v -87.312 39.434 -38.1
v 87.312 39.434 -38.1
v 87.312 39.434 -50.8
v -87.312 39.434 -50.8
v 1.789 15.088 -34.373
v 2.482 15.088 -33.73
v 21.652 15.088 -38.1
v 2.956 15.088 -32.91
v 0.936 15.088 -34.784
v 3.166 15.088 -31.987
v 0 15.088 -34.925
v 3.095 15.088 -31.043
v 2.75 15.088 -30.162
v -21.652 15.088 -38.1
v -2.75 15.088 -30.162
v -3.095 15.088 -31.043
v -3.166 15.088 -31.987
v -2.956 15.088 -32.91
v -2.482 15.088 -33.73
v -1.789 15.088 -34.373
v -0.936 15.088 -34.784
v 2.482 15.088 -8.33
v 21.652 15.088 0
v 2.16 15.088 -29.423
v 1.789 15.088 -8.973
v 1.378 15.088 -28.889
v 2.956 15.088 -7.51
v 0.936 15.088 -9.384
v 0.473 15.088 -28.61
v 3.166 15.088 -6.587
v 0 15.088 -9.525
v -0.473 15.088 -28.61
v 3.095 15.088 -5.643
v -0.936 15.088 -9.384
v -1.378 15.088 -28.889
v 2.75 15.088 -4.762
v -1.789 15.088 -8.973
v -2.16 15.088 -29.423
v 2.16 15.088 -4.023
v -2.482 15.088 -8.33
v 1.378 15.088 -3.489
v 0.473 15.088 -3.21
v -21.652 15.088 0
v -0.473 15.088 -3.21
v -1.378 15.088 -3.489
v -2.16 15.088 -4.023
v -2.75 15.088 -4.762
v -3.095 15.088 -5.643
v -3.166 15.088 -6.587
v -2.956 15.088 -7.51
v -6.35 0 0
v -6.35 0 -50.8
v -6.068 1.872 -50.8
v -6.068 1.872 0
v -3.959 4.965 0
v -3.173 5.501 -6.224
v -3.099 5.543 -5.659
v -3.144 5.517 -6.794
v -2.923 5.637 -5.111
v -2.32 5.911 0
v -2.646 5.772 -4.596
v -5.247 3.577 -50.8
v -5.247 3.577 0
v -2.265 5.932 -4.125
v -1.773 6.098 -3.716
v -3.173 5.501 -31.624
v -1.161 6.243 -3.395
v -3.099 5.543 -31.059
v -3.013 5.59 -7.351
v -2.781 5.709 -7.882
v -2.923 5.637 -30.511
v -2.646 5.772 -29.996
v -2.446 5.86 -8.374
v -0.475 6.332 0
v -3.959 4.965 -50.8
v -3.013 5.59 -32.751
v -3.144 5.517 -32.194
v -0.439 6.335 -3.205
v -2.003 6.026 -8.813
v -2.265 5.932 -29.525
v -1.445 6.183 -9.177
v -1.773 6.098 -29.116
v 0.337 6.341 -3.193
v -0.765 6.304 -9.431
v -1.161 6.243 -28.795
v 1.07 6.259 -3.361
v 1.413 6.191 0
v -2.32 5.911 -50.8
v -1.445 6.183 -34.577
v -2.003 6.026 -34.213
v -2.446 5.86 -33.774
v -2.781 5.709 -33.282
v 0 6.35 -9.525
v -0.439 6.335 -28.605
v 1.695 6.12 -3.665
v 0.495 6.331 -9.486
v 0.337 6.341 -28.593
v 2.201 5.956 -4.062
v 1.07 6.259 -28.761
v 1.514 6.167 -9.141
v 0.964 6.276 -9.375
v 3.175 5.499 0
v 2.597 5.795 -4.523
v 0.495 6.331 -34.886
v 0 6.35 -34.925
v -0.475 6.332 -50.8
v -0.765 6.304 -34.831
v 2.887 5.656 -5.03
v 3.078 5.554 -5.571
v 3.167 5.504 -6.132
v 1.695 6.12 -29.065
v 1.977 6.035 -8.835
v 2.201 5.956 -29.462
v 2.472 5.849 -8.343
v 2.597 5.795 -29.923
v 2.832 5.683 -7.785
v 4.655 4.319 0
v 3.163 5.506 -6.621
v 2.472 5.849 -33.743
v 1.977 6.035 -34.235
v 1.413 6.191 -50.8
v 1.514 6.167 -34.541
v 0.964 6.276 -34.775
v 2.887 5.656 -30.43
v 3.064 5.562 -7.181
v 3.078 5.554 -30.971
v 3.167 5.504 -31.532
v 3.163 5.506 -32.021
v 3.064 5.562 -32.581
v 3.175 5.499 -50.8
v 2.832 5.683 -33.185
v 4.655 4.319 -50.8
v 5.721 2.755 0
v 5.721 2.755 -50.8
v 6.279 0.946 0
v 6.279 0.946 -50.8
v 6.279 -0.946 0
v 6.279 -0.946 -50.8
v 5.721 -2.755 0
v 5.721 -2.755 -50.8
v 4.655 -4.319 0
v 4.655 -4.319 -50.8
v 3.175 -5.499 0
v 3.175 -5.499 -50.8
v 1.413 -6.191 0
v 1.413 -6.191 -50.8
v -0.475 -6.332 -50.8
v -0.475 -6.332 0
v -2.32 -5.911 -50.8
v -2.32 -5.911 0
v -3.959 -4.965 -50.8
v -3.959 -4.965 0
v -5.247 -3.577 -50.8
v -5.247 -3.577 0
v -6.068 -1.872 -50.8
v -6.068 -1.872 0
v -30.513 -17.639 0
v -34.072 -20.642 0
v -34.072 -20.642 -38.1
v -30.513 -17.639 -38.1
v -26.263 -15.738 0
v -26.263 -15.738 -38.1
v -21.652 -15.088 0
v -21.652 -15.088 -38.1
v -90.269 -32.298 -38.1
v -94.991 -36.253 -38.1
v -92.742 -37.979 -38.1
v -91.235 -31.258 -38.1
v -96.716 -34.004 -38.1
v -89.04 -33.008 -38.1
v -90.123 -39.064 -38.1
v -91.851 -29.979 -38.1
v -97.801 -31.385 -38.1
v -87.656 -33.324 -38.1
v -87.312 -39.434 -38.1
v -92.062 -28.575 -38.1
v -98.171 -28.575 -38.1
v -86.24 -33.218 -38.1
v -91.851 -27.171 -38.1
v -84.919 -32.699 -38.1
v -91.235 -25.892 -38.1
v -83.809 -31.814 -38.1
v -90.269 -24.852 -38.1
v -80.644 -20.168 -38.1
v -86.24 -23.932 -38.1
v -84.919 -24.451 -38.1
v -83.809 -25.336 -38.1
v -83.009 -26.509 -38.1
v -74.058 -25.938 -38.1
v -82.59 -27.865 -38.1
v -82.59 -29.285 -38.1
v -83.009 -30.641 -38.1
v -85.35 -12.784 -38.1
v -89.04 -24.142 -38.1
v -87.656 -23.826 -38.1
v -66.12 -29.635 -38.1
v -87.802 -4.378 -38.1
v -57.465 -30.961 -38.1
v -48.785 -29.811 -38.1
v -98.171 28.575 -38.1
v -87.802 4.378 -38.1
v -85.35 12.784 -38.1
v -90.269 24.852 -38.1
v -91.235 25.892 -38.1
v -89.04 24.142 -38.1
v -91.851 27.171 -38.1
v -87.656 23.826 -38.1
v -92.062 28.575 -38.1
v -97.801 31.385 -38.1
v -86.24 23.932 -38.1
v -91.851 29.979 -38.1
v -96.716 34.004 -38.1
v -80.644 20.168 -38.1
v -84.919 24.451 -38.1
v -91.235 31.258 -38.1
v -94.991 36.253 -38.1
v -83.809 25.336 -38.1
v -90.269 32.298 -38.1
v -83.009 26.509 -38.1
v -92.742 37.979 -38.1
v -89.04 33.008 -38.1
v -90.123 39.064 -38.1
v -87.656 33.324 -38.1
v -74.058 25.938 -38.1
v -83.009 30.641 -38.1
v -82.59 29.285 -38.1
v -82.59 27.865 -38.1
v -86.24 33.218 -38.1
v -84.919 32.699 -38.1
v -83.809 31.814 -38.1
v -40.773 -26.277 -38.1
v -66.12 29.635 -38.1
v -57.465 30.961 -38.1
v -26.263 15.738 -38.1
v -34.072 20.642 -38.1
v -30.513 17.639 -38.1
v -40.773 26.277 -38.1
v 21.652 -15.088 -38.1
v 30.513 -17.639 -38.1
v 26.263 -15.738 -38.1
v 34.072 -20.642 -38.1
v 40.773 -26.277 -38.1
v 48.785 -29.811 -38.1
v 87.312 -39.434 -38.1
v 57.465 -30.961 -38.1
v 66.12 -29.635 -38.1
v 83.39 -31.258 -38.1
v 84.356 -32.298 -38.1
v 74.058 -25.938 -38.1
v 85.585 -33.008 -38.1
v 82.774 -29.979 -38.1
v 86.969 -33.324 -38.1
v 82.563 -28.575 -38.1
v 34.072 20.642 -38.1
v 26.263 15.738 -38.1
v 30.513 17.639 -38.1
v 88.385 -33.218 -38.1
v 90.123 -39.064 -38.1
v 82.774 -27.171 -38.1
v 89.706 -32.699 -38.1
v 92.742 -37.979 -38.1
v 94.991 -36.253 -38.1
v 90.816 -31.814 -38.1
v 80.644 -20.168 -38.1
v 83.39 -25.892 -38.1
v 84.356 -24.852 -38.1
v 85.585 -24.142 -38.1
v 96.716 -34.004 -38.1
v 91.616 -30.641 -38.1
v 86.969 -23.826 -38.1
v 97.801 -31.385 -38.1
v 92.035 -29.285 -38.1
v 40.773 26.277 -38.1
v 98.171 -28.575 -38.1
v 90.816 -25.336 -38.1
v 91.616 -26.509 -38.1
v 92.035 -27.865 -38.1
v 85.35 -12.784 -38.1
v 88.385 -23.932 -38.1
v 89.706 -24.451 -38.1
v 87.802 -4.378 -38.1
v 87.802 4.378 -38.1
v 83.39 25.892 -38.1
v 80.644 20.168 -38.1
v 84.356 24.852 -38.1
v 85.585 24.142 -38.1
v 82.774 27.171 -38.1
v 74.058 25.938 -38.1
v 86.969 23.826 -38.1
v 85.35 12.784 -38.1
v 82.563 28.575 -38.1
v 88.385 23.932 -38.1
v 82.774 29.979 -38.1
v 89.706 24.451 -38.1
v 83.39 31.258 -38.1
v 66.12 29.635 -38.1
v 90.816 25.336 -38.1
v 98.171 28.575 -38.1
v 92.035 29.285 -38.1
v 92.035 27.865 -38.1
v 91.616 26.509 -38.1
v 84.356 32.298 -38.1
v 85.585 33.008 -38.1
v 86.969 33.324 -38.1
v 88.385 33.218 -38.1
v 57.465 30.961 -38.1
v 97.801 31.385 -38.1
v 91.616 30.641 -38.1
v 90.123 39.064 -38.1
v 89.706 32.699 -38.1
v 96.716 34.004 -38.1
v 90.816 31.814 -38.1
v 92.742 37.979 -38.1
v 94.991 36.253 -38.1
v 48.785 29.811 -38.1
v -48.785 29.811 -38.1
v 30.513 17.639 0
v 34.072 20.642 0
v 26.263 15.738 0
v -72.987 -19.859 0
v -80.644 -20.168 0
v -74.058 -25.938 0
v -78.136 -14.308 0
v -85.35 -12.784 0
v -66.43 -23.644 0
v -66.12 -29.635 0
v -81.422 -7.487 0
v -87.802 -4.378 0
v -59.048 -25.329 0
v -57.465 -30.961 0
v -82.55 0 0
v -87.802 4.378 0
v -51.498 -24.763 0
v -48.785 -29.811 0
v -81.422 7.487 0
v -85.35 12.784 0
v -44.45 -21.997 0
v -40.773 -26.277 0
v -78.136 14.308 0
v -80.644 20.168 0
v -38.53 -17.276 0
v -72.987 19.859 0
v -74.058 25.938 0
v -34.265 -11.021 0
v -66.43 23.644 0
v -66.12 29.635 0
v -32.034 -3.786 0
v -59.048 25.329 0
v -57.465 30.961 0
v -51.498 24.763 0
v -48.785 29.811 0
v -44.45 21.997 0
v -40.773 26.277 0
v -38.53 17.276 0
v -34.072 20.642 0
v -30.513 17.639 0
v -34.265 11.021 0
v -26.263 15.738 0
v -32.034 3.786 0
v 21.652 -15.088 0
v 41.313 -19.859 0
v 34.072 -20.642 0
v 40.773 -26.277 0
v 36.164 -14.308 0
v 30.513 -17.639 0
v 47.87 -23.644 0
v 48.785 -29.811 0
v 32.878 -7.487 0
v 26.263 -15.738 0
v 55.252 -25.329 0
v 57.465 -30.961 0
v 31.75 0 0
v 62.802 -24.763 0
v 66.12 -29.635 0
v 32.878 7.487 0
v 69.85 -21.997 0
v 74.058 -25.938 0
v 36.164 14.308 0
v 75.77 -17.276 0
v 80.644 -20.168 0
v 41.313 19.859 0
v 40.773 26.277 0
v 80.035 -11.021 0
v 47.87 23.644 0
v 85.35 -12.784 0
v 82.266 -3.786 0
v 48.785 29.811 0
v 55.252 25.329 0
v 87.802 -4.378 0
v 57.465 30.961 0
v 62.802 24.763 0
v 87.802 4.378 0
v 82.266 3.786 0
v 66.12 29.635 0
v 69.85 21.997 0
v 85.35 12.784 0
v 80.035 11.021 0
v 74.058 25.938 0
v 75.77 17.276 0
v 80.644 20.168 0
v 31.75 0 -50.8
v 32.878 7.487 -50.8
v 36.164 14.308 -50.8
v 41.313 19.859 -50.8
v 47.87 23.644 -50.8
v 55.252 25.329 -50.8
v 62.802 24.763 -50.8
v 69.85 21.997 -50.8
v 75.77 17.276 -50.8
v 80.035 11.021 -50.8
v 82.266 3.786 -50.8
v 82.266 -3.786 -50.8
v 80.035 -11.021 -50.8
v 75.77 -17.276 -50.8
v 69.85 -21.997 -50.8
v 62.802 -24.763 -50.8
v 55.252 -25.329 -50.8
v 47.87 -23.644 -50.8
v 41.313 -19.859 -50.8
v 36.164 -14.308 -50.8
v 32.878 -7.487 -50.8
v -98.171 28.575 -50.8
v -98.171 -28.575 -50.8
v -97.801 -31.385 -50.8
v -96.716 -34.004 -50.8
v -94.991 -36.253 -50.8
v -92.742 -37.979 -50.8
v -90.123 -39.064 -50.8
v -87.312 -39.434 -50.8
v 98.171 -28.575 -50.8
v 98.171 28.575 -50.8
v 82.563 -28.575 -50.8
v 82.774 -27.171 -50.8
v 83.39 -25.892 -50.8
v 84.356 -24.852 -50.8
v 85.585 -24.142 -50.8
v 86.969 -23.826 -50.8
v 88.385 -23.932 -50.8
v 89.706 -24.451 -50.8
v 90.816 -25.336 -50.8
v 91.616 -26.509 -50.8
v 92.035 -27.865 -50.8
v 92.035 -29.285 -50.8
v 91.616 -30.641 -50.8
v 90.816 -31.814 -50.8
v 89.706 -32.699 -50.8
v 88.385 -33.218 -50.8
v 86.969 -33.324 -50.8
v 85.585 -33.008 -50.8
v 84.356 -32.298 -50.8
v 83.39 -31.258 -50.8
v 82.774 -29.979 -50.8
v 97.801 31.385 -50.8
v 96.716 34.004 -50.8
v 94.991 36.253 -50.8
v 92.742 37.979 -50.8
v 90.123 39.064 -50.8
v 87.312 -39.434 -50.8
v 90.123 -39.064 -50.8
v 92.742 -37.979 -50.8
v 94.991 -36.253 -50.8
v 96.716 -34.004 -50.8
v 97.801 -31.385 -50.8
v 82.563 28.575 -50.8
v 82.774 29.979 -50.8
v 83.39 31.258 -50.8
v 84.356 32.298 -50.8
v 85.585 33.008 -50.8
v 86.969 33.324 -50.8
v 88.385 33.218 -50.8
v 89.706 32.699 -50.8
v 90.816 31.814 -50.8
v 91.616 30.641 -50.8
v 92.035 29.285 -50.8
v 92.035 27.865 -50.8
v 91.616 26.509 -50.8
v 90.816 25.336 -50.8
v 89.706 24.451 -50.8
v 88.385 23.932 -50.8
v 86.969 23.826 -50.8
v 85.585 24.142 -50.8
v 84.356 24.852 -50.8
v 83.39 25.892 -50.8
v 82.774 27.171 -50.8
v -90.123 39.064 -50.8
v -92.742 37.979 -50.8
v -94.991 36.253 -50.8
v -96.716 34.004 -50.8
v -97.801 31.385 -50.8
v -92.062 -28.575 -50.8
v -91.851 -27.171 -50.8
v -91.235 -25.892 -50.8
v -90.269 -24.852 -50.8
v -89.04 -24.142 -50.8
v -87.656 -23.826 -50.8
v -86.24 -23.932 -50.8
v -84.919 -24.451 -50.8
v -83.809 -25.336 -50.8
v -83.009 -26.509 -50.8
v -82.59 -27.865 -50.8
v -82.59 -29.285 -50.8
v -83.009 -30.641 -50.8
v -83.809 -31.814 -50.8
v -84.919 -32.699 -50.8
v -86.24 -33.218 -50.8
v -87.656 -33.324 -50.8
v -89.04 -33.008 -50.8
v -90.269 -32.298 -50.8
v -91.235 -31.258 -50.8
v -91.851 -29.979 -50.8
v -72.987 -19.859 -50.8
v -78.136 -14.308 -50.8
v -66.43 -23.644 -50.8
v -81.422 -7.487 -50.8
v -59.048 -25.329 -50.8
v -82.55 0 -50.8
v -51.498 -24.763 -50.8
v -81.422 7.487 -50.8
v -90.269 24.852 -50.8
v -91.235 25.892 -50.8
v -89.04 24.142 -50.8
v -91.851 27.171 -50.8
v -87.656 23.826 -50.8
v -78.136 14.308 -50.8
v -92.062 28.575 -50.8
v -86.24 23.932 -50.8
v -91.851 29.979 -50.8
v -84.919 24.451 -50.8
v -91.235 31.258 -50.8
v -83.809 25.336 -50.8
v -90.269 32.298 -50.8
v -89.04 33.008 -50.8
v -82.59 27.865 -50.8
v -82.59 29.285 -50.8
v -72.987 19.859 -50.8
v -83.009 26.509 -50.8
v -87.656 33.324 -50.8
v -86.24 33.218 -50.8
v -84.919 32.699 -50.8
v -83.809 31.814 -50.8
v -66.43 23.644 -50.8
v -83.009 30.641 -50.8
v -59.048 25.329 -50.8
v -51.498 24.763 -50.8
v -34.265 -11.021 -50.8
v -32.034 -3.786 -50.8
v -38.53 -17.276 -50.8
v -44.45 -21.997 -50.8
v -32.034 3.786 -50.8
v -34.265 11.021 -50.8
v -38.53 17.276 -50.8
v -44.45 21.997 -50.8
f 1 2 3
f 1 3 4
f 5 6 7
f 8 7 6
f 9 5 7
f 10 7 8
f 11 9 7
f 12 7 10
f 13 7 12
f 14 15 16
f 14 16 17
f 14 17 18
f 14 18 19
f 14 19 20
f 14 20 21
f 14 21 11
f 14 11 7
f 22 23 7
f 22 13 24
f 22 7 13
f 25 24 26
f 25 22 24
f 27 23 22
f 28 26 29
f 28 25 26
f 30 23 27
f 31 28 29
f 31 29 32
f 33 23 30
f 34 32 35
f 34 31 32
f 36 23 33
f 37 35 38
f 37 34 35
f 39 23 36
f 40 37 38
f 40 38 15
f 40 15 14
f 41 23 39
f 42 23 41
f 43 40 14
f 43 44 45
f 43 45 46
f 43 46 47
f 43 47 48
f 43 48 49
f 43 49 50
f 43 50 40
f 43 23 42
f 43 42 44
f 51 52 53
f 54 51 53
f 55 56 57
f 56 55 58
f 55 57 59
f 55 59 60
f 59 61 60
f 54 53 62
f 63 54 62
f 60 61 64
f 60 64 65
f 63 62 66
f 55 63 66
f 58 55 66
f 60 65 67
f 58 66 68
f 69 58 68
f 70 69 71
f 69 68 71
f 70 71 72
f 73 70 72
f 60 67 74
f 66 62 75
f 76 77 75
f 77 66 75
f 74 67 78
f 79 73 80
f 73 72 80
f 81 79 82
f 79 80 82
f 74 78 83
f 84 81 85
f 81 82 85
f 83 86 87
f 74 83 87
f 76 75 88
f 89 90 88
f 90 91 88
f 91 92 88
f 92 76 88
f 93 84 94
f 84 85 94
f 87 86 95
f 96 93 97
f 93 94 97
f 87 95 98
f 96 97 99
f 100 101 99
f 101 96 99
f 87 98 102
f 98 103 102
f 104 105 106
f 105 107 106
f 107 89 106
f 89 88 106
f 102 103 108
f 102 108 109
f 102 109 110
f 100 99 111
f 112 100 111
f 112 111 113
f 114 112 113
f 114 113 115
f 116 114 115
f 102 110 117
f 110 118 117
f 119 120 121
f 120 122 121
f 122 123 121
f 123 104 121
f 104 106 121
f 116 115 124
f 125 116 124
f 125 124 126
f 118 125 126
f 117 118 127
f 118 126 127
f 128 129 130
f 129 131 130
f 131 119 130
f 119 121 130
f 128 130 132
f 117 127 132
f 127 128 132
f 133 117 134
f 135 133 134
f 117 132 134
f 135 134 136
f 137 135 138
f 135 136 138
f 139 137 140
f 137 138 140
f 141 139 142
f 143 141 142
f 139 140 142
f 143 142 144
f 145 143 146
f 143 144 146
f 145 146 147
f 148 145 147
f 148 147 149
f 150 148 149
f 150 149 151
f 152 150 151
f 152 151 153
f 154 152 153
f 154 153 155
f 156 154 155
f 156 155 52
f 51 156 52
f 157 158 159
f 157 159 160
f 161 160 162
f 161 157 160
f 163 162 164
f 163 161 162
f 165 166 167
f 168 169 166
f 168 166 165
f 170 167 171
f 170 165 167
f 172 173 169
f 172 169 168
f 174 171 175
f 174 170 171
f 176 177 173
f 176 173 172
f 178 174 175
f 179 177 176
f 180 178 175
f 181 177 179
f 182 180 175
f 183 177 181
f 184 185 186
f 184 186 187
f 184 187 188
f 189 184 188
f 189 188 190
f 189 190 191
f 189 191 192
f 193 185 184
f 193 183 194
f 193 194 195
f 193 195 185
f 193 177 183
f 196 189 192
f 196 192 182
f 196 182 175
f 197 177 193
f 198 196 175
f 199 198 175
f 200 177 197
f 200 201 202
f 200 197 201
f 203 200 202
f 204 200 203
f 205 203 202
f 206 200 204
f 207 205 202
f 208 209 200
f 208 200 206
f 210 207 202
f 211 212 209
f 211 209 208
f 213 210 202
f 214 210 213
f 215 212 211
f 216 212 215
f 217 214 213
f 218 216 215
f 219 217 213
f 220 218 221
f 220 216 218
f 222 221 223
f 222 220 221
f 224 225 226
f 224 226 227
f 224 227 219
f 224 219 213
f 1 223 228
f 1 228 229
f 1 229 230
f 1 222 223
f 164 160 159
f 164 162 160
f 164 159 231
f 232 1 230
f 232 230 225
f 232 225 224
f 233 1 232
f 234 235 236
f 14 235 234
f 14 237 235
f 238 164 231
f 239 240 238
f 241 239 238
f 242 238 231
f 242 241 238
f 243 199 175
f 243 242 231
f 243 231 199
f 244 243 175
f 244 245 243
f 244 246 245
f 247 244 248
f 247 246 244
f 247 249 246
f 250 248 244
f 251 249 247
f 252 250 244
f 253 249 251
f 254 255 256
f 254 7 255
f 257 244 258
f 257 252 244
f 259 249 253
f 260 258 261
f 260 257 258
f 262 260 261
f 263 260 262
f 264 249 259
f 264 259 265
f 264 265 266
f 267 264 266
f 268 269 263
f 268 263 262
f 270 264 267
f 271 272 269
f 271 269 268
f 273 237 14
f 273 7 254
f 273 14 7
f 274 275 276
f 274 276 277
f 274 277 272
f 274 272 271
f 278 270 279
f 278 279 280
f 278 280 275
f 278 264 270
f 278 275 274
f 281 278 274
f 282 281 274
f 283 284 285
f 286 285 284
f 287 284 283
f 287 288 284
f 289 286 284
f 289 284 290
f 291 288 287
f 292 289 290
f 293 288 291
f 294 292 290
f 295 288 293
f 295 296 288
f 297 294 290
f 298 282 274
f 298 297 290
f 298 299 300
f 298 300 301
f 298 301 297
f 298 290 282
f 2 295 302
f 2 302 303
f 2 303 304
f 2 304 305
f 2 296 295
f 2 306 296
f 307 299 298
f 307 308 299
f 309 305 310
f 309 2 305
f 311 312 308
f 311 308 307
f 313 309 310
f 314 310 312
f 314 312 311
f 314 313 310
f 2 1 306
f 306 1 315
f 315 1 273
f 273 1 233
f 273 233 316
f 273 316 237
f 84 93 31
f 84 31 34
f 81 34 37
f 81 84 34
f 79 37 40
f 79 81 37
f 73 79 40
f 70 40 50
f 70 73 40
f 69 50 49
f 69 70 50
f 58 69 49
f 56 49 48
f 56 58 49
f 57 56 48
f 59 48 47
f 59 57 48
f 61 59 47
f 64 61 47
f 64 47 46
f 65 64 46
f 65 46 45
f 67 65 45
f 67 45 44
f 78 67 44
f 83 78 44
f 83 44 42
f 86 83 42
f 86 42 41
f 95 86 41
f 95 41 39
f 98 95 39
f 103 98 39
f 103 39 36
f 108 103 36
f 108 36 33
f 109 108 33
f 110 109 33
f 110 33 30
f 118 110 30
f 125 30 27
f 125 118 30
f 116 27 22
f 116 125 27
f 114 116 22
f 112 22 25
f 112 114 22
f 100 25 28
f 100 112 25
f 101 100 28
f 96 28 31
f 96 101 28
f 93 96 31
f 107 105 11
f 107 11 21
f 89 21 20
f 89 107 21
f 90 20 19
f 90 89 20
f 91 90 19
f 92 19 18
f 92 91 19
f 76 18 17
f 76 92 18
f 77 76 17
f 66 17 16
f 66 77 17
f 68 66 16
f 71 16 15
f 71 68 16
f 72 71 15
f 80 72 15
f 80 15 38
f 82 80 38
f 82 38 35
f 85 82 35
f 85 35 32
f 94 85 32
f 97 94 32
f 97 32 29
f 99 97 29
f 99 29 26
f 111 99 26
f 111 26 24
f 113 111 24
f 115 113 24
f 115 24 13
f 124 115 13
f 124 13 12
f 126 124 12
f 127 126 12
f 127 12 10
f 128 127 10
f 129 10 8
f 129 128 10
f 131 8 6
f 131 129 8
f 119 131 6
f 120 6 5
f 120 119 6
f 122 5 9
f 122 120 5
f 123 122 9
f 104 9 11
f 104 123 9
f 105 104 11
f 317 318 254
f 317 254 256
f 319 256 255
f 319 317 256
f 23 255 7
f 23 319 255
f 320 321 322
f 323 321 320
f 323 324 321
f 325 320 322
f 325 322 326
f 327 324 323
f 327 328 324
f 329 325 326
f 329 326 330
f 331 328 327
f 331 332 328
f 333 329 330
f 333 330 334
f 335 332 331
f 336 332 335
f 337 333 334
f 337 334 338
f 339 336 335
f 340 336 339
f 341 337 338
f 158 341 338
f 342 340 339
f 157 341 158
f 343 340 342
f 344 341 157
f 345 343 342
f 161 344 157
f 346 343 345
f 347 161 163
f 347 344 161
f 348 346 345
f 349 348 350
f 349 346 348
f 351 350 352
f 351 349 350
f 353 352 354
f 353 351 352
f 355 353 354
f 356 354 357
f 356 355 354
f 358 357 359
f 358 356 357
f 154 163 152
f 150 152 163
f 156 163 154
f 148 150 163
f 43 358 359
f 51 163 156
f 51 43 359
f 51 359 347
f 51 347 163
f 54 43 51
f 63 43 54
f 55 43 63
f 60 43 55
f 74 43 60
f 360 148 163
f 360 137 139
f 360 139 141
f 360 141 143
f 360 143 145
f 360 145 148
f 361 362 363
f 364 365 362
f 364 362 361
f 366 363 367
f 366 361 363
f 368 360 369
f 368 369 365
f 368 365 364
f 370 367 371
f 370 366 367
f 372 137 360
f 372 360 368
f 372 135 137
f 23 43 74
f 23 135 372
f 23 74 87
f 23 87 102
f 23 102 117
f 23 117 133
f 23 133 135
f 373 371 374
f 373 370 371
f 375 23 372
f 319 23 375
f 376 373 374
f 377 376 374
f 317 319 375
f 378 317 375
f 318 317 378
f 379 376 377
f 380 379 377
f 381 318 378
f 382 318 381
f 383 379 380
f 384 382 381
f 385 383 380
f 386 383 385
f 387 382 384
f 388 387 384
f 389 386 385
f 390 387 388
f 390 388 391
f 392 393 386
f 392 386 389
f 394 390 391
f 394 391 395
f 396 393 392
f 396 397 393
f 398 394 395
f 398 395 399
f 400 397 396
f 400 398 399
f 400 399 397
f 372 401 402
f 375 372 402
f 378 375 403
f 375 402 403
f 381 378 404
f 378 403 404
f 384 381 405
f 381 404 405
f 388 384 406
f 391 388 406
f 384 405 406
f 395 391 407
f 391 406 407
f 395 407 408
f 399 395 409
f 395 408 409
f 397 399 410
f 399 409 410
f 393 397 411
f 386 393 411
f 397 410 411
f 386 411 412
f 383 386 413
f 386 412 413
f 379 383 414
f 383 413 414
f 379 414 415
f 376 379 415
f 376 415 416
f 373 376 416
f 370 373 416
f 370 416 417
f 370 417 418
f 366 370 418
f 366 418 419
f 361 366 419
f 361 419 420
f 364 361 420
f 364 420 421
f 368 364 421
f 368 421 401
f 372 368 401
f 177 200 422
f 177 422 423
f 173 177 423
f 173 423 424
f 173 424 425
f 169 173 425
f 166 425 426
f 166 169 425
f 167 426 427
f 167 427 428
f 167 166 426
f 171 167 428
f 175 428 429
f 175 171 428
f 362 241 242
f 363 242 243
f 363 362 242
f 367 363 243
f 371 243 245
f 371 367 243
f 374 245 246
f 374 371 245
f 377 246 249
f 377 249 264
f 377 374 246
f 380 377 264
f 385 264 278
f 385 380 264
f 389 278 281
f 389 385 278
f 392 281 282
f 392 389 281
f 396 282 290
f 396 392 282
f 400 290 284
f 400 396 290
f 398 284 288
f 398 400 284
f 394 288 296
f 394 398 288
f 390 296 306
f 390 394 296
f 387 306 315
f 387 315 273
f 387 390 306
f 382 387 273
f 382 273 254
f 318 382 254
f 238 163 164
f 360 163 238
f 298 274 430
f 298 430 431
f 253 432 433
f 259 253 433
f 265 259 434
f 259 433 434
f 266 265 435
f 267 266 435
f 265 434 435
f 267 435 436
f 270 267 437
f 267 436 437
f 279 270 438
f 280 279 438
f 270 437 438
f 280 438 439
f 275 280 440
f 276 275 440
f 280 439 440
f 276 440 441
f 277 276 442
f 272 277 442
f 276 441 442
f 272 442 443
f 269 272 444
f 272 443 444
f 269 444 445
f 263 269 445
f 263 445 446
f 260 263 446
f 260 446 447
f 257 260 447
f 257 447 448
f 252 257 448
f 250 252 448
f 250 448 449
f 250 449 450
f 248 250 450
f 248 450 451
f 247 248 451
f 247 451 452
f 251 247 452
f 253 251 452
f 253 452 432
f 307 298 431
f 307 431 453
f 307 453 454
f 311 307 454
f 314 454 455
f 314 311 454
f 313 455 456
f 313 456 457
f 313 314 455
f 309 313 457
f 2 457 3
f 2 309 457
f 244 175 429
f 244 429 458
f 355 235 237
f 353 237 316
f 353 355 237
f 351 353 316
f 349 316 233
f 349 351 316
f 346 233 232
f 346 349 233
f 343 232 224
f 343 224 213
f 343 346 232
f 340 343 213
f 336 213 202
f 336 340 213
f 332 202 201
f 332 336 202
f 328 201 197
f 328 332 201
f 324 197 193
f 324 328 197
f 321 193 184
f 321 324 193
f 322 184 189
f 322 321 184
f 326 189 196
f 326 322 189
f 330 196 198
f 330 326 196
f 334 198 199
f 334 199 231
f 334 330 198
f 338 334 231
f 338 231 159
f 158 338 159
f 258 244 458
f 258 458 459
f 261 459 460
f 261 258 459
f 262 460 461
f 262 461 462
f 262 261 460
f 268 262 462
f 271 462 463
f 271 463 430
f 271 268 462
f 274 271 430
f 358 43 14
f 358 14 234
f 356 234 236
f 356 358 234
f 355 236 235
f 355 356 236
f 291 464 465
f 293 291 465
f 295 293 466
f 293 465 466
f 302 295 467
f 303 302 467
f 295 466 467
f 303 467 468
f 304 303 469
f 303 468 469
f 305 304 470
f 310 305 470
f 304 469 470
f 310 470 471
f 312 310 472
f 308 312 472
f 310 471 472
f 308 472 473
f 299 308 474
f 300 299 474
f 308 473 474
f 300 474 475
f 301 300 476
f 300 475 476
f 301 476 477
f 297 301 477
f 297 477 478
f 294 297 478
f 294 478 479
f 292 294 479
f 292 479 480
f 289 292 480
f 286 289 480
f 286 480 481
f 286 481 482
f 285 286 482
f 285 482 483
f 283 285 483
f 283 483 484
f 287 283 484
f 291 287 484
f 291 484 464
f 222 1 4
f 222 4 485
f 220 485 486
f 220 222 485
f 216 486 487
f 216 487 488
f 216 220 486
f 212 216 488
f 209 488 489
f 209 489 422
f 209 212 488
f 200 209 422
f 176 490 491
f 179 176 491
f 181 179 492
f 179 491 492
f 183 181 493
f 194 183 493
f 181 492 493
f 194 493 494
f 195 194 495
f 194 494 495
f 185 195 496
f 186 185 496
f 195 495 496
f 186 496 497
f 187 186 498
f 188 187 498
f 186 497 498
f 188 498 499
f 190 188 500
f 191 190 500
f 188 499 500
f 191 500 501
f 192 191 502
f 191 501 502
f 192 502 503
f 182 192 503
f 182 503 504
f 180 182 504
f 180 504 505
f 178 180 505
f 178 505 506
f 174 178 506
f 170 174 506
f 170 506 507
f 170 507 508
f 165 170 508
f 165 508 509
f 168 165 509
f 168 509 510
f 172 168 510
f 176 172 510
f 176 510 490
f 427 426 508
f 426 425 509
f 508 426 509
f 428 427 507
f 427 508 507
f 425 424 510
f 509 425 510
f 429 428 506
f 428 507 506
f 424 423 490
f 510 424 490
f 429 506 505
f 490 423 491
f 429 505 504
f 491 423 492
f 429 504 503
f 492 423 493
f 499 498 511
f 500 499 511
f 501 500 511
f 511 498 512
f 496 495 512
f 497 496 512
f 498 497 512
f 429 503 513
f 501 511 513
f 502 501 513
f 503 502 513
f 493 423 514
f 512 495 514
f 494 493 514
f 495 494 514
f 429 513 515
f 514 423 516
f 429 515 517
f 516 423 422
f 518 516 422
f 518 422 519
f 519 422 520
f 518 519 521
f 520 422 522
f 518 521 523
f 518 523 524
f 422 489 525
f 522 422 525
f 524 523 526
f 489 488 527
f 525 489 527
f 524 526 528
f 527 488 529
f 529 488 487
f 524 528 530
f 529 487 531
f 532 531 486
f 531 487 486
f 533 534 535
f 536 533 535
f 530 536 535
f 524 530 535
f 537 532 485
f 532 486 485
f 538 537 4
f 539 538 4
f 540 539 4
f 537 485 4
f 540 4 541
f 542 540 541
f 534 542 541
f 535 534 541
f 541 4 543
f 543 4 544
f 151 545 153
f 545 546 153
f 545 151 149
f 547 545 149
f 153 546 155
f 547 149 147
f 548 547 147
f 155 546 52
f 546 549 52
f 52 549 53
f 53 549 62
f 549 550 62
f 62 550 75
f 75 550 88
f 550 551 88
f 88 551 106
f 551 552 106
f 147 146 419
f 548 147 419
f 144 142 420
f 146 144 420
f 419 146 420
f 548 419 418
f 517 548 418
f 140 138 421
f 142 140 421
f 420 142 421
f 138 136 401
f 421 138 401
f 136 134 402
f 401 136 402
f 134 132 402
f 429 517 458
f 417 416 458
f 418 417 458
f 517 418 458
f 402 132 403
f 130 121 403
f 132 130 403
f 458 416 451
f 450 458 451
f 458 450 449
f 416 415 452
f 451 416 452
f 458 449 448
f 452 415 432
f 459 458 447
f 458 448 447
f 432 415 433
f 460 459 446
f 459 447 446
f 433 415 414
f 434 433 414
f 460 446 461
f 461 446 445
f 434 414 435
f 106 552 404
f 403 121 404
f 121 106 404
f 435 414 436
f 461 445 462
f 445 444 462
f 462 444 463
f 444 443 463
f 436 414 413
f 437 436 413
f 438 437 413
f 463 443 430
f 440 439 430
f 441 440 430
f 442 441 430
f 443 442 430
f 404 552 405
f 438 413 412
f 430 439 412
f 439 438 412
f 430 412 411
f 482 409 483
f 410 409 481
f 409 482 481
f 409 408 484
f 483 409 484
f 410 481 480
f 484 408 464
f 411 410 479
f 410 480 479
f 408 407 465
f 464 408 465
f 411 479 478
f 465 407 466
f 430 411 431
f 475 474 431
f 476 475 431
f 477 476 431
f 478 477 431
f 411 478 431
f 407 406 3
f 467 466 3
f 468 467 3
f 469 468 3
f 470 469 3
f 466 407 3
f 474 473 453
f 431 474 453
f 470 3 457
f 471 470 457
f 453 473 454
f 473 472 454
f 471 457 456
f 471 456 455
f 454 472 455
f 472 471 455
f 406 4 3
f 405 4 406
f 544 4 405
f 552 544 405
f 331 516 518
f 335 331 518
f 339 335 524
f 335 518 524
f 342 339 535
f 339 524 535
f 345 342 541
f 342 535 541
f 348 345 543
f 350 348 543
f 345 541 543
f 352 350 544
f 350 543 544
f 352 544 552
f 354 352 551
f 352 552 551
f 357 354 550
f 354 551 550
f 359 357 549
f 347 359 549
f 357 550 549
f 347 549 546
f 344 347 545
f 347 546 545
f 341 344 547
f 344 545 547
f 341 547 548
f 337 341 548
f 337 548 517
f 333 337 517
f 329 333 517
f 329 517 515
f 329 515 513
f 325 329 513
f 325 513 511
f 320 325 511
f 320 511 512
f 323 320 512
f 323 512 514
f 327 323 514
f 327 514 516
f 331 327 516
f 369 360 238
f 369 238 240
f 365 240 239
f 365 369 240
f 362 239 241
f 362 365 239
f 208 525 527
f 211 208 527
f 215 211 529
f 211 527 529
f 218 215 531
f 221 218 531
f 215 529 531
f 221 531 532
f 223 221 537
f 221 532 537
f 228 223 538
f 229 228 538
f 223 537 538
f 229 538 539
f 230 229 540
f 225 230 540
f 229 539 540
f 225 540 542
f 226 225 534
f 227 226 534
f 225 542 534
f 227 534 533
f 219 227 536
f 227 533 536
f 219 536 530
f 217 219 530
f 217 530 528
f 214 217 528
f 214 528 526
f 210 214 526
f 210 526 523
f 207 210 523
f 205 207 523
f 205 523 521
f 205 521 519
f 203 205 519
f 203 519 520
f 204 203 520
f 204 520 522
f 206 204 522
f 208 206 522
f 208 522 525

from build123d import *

# Parameters (mm, degrees)
BASE_EXTRUDE_DEPTH           = 50.8
BASE_EXTRUDE_DRAFT           = 3
SKETCH2_W                    = 245.218721479
SKETCH2_H                    = 134.011608982
CUT_EXTRUDE5_DEPTH           = 38.1
CUT_EXTRUDE5_DRAFT           = -5
SKETCH3_R                    = 24.60625
CUT_EXTRUDE1_DEPTH           = 123.388297682
CUT_EXTRUDE1_DRAFT           = -5
CUT_EXTRUDE1_PROFILE_2_DEPTH = 123.388297682
CUT_EXTRUDE1_PROFILE_2_DRAFT = -5
SKETCH5_W                    = 217.80183091
SKETCH5_H                    = 114.879329543
MILL_OUTSIDE_DEPTH           = 123.388297682
SKETCH9_W                    = 228.055799475
SKETCH9_H                    = 112.000717684
MILL_BOSS_DEPTH              = 38.1
SKETCH4_R                    = 25.4
SKETCH4_R_2                  = 6.35
SKETCH4_R_3                  = 4.7625
BORES_AND_HOLES_DEPTH        = 118.359218484
SKETCH18_R                   = 3.175
SET_SCREW_HOLES_DEPTH        = 38.1


with BuildPart() as part:
    # Sketch1 → Base-Extrude (with draft: the straight prism first)
    with BuildSketch(Plane.XY):
        with BuildLine():
            Line((99.7585, -28.575), (99.7585, 28.575))
            ThreePointArc((99.7585, 28.575), (96.113150999, 37.375650999), (87.3125, 41.021))
            Line((87.3125, 41.021), (-87.3125, 41.021))
            ThreePointArc((-87.3125, 41.021), (-96.113150999, 37.375650999), (-99.7585, 28.575))
            Line((-99.7585, 28.575), (-99.7585, -28.575))
            ThreePointArc((-99.7585, -28.575), (-96.113150999, -37.375650999), (-87.3125, -41.021))
            Line((-87.3125, -41.021), (87.3125, -41.021))
            ThreePointArc((87.3125, -41.021), (96.113150999, -37.375650999), (99.7585, -28.575))
        make_face()
    extrude(amount=-BASE_EXTRUDE_DEPTH)
    # Base-Extrude: the draft: its side faces are tilted about the plane it starts from
    base_extrude_sides = [part.faces().sort_by_distance(p)[0] for p in [
        (99.7585, 0, -25.4),
        (96.113150999, 37.375650999, -25.4),
        (0, 41.021, -25.4),
        (-96.113150999, 37.375650999, -25.4),
        (-99.7585, 0, -25.4),
        (-96.113150999, -37.375650999, -25.4),
        (0, -41.021, -25.4),
        (96.113150999, -37.375650999, -25.4),
    ]]
    draft(base_extrude_sides, Plane.XY, BASE_EXTRUDE_DRAFT)


with BuildPart() as cut_extrude5_tool:
    # Sketch2 → Cut-Extrude5 (with draft: the straight prism first)
    with BuildSketch(Plane.XY):
        with Locations((-2.312638736, -3.991522499)):
            Rectangle(SKETCH2_W, SKETCH2_H)
        with BuildLine():
            Line((-21.652420857, 19.05), (21.652420857, 19.05))
            ThreePointArc((21.652420857, 19.05), (26.837174146, 20.156539199), (31.118441962, 23.283333333))
            ThreePointArc((31.118441962, 23.283333333), (92.075, 0), (31.118441962, -23.283333333))
            ThreePointArc((31.118441962, -23.283333333), (26.837174146, -20.156539199), (21.652420857, -19.05))
            Line((21.652420857, -19.05), (-21.652420857, -19.05))
            ThreePointArc((-21.652420857, -19.05), (-26.837174146, -20.156539199), (-31.118441962, -23.283333333))
            ThreePointArc((-31.118441962, -23.283333333), (-92.075, 0), (-31.118441962, 23.283333333))
            ThreePointArc((-31.118441962, 23.283333333), (-26.837174146, 20.156539199), (-21.652420857, 19.05))
        make_face(mode=Mode.SUBTRACT)
    extrude(amount=-CUT_EXTRUDE5_DEPTH)
    # Cut-Extrude5: the draft: its side faces are tilted about the plane it starts from
    cut_extrude5_sides = [cut_extrude5_tool.faces().sort_by_distance(p)[0] for p in [
        (-124.921999475, -3.991522499, -19.05),
        (-2.312638735, -70.99732699, -19.05),
        (120.296722004, -3.991522499, -19.05),
        (-2.312638735, 63.014281992, -19.05),
        (-26.837174146, 20.156539199, -19.05),
        (0, 19.05, -19.05),
        (26.837174146, 20.156539199, -19.05),
        (92.075, 0, -19.05),
        (26.837174146, -20.156539199, -19.05),
        (0, -19.05, -19.05),
        (-26.837174146, -20.156539199, -19.05),
        (-92.075, 0, -19.05),
    ]]
    draft(cut_extrude5_sides, Plane.XY, CUT_EXTRUDE5_DRAFT)


with BuildPart() as part_1:
    add(part.part)

    # Cut-Extrude5: cut by cut_extrude5_tool
    add(cut_extrude5_tool.part, mode=Mode.SUBTRACT)


with BuildPart() as cut_extrude1_tool:
    # Sketch3 → Cut-Extrude1 (with draft: the straight prism first)
    with BuildSketch(Plane(origin=(0, 0, -50.8), x_dir=(-1, 0, 0), z_dir=(0, 0, -1))):
        with Locations((57.15, 0)):
            Circle(SKETCH3_R)
    extrude(amount=-CUT_EXTRUDE1_DEPTH)
    # Cut-Extrude1: the draft: its side faces are tilted about the plane it starts from
    cut_extrude1_sides = [cut_extrude1_tool.faces().sort_by_distance(p)[0] for p in [
        (-32.54375, 0, 10.894148841),
    ]]
    draft(cut_extrude1_sides, Plane(origin=(0, 0, -50.8), x_dir=(-1, 0, 0), z_dir=(0, 0, -1)), CUT_EXTRUDE1_DRAFT)


with BuildPart() as part_2:
    add(part_1.part)

    # Cut-Extrude1: cut by cut_extrude1_tool
    add(cut_extrude1_tool.part, mode=Mode.SUBTRACT)


with BuildPart() as cut_extrude1_profile_2_tool:
    # Sketch3 → Cut-Extrude1 profile 2 (with draft: the straight prism first)
    with BuildSketch(Plane(origin=(0, 0, -50.8), x_dir=(-1, 0, 0), z_dir=(0, 0, -1))):
        with Locations((-57.15, 0)):
            Circle(SKETCH3_R)
    extrude(amount=-CUT_EXTRUDE1_PROFILE_2_DEPTH)
    # Cut-Extrude1 profile 2: the draft: its side faces are tilted about the plane it starts from
    cut_extrude1_profile_2_sides = [cut_extrude1_profile_2_tool.faces().sort_by_distance(p)[0] for p in [
        (81.75625, 0, 10.894148841),
    ]]
    draft(cut_extrude1_profile_2_sides, Plane(origin=(0, 0, -50.8), x_dir=(-1, 0, 0), z_dir=(0, 0, -1)), CUT_EXTRUDE1_PROFILE_2_DRAFT)


with BuildPart() as part_3:
    add(part_2.part)

    # Cut-Extrude1 profile 2: cut by cut_extrude1_profile_2_tool
    add(cut_extrude1_profile_2_tool.part, mode=Mode.SUBTRACT)

    # Sketch5 → Mill outside (cut, through all)
    with BuildSketch(Plane.XY):
        with Locations((-0.351671417, -5.861190283)):
            Rectangle(SKETCH5_W, SKETCH5_H)
        with BuildLine():
            Line((98.171, -28.575), (98.171, 28.575))
            ThreePointArc((98.171, 28.575), (94.990618984, 36.253118984), (87.3125, 39.4335))
            Line((87.3125, 39.4335), (-87.3125, 39.4335))
            ThreePointArc((-87.3125, 39.4335), (-94.990618984, 36.253118984), (-98.171, 28.575))
            Line((-98.171, 28.575), (-98.171, -28.575))
            ThreePointArc((-98.171, -28.575), (-94.990618984, -36.253118984), (-87.3125, -39.4335))
            Line((-87.3125, -39.4335), (87.3125, -39.4335))
            ThreePointArc((87.3125, -39.4335), (94.990618984, -36.253118984), (98.171, -28.575))
        make_face(mode=Mode.SUBTRACT)
    extrude(amount=-MILL_OUTSIDE_DEPTH, mode=Mode.SUBTRACT)

    # Sketch9 → Mill boss (cut)
    with BuildSketch(Plane.XY):
        with Locations((8.711546203, 4.265795104)):
            Rectangle(SKETCH9_W, SKETCH9_H)
        with BuildLine():
            Line((-21.652420857, -15.0876), (21.652420857, -15.0876))
            ThreePointArc((21.652420857, -15.0876), (28.454817172, -16.53937943), (34.071840547, -20.641733333))
            ThreePointArc((34.071840547, -20.641733333), (88.1126, 0), (34.071840547, 20.641733333))
            ThreePointArc((34.071840547, 20.641733333), (28.454817172, 16.53937943), (21.652420857, 15.0876))
            Line((21.652420857, 15.0876), (-21.652420857, 15.0876))
            ThreePointArc((-21.652420857, 15.0876), (-28.454817172, 16.53937943), (-34.071840547, 20.641733333))
            ThreePointArc((-34.071840547, 20.641733333), (-88.1126, 0), (-34.071840547, -20.641733333))
            ThreePointArc((-34.071840547, -20.641733333), (-28.454817172, -16.53937943), (-21.652420857, -15.0876))
        make_face(mode=Mode.SUBTRACT)
    extrude(amount=-MILL_BOSS_DEPTH, mode=Mode.SUBTRACT)

    # Sketch4 → Bores and holes (cut, through all)
    with BuildSketch(Plane(origin=(0, 0, -50.8), x_dir=(-1, 0, 0), z_dir=(0, 0, -1))):
        with Locations((-57.15, 0)):
            Circle(SKETCH4_R)
        with Locations((57.15, 0)):
            Circle(SKETCH4_R)
        Circle(SKETCH4_R_2)
        with Locations((-87.3252, 28.575)):
            Circle(SKETCH4_R_3)
        with Locations((-87.3252, -28.575)):
            Circle(SKETCH4_R_3)
        with Locations((87.2998, -28.575)):
            Circle(SKETCH4_R_3)
        with Locations((87.2998, 28.575)):
            Circle(SKETCH4_R_3)
    extrude(amount=-BORES_AND_HOLES_DEPTH, mode=Mode.SUBTRACT)

    # Sketch18 → Set screw holes (cut)
    with BuildSketch(Plane(origin=(0, 0, 0), x_dir=(1, 0, 0), z_dir=(0, 1, 0))):
        with Locations(Location((0, 6.35, 0), (0, 0, 90))):
            Circle(SKETCH18_R)
        with Locations(Location((0, 31.75, 0), (0, 0, 90))):
            Circle(SKETCH18_R)
    extrude(amount=SET_SCREW_HOLES_DEPTH, mode=Mode.SUBTRACT)


solid = part_3.part
